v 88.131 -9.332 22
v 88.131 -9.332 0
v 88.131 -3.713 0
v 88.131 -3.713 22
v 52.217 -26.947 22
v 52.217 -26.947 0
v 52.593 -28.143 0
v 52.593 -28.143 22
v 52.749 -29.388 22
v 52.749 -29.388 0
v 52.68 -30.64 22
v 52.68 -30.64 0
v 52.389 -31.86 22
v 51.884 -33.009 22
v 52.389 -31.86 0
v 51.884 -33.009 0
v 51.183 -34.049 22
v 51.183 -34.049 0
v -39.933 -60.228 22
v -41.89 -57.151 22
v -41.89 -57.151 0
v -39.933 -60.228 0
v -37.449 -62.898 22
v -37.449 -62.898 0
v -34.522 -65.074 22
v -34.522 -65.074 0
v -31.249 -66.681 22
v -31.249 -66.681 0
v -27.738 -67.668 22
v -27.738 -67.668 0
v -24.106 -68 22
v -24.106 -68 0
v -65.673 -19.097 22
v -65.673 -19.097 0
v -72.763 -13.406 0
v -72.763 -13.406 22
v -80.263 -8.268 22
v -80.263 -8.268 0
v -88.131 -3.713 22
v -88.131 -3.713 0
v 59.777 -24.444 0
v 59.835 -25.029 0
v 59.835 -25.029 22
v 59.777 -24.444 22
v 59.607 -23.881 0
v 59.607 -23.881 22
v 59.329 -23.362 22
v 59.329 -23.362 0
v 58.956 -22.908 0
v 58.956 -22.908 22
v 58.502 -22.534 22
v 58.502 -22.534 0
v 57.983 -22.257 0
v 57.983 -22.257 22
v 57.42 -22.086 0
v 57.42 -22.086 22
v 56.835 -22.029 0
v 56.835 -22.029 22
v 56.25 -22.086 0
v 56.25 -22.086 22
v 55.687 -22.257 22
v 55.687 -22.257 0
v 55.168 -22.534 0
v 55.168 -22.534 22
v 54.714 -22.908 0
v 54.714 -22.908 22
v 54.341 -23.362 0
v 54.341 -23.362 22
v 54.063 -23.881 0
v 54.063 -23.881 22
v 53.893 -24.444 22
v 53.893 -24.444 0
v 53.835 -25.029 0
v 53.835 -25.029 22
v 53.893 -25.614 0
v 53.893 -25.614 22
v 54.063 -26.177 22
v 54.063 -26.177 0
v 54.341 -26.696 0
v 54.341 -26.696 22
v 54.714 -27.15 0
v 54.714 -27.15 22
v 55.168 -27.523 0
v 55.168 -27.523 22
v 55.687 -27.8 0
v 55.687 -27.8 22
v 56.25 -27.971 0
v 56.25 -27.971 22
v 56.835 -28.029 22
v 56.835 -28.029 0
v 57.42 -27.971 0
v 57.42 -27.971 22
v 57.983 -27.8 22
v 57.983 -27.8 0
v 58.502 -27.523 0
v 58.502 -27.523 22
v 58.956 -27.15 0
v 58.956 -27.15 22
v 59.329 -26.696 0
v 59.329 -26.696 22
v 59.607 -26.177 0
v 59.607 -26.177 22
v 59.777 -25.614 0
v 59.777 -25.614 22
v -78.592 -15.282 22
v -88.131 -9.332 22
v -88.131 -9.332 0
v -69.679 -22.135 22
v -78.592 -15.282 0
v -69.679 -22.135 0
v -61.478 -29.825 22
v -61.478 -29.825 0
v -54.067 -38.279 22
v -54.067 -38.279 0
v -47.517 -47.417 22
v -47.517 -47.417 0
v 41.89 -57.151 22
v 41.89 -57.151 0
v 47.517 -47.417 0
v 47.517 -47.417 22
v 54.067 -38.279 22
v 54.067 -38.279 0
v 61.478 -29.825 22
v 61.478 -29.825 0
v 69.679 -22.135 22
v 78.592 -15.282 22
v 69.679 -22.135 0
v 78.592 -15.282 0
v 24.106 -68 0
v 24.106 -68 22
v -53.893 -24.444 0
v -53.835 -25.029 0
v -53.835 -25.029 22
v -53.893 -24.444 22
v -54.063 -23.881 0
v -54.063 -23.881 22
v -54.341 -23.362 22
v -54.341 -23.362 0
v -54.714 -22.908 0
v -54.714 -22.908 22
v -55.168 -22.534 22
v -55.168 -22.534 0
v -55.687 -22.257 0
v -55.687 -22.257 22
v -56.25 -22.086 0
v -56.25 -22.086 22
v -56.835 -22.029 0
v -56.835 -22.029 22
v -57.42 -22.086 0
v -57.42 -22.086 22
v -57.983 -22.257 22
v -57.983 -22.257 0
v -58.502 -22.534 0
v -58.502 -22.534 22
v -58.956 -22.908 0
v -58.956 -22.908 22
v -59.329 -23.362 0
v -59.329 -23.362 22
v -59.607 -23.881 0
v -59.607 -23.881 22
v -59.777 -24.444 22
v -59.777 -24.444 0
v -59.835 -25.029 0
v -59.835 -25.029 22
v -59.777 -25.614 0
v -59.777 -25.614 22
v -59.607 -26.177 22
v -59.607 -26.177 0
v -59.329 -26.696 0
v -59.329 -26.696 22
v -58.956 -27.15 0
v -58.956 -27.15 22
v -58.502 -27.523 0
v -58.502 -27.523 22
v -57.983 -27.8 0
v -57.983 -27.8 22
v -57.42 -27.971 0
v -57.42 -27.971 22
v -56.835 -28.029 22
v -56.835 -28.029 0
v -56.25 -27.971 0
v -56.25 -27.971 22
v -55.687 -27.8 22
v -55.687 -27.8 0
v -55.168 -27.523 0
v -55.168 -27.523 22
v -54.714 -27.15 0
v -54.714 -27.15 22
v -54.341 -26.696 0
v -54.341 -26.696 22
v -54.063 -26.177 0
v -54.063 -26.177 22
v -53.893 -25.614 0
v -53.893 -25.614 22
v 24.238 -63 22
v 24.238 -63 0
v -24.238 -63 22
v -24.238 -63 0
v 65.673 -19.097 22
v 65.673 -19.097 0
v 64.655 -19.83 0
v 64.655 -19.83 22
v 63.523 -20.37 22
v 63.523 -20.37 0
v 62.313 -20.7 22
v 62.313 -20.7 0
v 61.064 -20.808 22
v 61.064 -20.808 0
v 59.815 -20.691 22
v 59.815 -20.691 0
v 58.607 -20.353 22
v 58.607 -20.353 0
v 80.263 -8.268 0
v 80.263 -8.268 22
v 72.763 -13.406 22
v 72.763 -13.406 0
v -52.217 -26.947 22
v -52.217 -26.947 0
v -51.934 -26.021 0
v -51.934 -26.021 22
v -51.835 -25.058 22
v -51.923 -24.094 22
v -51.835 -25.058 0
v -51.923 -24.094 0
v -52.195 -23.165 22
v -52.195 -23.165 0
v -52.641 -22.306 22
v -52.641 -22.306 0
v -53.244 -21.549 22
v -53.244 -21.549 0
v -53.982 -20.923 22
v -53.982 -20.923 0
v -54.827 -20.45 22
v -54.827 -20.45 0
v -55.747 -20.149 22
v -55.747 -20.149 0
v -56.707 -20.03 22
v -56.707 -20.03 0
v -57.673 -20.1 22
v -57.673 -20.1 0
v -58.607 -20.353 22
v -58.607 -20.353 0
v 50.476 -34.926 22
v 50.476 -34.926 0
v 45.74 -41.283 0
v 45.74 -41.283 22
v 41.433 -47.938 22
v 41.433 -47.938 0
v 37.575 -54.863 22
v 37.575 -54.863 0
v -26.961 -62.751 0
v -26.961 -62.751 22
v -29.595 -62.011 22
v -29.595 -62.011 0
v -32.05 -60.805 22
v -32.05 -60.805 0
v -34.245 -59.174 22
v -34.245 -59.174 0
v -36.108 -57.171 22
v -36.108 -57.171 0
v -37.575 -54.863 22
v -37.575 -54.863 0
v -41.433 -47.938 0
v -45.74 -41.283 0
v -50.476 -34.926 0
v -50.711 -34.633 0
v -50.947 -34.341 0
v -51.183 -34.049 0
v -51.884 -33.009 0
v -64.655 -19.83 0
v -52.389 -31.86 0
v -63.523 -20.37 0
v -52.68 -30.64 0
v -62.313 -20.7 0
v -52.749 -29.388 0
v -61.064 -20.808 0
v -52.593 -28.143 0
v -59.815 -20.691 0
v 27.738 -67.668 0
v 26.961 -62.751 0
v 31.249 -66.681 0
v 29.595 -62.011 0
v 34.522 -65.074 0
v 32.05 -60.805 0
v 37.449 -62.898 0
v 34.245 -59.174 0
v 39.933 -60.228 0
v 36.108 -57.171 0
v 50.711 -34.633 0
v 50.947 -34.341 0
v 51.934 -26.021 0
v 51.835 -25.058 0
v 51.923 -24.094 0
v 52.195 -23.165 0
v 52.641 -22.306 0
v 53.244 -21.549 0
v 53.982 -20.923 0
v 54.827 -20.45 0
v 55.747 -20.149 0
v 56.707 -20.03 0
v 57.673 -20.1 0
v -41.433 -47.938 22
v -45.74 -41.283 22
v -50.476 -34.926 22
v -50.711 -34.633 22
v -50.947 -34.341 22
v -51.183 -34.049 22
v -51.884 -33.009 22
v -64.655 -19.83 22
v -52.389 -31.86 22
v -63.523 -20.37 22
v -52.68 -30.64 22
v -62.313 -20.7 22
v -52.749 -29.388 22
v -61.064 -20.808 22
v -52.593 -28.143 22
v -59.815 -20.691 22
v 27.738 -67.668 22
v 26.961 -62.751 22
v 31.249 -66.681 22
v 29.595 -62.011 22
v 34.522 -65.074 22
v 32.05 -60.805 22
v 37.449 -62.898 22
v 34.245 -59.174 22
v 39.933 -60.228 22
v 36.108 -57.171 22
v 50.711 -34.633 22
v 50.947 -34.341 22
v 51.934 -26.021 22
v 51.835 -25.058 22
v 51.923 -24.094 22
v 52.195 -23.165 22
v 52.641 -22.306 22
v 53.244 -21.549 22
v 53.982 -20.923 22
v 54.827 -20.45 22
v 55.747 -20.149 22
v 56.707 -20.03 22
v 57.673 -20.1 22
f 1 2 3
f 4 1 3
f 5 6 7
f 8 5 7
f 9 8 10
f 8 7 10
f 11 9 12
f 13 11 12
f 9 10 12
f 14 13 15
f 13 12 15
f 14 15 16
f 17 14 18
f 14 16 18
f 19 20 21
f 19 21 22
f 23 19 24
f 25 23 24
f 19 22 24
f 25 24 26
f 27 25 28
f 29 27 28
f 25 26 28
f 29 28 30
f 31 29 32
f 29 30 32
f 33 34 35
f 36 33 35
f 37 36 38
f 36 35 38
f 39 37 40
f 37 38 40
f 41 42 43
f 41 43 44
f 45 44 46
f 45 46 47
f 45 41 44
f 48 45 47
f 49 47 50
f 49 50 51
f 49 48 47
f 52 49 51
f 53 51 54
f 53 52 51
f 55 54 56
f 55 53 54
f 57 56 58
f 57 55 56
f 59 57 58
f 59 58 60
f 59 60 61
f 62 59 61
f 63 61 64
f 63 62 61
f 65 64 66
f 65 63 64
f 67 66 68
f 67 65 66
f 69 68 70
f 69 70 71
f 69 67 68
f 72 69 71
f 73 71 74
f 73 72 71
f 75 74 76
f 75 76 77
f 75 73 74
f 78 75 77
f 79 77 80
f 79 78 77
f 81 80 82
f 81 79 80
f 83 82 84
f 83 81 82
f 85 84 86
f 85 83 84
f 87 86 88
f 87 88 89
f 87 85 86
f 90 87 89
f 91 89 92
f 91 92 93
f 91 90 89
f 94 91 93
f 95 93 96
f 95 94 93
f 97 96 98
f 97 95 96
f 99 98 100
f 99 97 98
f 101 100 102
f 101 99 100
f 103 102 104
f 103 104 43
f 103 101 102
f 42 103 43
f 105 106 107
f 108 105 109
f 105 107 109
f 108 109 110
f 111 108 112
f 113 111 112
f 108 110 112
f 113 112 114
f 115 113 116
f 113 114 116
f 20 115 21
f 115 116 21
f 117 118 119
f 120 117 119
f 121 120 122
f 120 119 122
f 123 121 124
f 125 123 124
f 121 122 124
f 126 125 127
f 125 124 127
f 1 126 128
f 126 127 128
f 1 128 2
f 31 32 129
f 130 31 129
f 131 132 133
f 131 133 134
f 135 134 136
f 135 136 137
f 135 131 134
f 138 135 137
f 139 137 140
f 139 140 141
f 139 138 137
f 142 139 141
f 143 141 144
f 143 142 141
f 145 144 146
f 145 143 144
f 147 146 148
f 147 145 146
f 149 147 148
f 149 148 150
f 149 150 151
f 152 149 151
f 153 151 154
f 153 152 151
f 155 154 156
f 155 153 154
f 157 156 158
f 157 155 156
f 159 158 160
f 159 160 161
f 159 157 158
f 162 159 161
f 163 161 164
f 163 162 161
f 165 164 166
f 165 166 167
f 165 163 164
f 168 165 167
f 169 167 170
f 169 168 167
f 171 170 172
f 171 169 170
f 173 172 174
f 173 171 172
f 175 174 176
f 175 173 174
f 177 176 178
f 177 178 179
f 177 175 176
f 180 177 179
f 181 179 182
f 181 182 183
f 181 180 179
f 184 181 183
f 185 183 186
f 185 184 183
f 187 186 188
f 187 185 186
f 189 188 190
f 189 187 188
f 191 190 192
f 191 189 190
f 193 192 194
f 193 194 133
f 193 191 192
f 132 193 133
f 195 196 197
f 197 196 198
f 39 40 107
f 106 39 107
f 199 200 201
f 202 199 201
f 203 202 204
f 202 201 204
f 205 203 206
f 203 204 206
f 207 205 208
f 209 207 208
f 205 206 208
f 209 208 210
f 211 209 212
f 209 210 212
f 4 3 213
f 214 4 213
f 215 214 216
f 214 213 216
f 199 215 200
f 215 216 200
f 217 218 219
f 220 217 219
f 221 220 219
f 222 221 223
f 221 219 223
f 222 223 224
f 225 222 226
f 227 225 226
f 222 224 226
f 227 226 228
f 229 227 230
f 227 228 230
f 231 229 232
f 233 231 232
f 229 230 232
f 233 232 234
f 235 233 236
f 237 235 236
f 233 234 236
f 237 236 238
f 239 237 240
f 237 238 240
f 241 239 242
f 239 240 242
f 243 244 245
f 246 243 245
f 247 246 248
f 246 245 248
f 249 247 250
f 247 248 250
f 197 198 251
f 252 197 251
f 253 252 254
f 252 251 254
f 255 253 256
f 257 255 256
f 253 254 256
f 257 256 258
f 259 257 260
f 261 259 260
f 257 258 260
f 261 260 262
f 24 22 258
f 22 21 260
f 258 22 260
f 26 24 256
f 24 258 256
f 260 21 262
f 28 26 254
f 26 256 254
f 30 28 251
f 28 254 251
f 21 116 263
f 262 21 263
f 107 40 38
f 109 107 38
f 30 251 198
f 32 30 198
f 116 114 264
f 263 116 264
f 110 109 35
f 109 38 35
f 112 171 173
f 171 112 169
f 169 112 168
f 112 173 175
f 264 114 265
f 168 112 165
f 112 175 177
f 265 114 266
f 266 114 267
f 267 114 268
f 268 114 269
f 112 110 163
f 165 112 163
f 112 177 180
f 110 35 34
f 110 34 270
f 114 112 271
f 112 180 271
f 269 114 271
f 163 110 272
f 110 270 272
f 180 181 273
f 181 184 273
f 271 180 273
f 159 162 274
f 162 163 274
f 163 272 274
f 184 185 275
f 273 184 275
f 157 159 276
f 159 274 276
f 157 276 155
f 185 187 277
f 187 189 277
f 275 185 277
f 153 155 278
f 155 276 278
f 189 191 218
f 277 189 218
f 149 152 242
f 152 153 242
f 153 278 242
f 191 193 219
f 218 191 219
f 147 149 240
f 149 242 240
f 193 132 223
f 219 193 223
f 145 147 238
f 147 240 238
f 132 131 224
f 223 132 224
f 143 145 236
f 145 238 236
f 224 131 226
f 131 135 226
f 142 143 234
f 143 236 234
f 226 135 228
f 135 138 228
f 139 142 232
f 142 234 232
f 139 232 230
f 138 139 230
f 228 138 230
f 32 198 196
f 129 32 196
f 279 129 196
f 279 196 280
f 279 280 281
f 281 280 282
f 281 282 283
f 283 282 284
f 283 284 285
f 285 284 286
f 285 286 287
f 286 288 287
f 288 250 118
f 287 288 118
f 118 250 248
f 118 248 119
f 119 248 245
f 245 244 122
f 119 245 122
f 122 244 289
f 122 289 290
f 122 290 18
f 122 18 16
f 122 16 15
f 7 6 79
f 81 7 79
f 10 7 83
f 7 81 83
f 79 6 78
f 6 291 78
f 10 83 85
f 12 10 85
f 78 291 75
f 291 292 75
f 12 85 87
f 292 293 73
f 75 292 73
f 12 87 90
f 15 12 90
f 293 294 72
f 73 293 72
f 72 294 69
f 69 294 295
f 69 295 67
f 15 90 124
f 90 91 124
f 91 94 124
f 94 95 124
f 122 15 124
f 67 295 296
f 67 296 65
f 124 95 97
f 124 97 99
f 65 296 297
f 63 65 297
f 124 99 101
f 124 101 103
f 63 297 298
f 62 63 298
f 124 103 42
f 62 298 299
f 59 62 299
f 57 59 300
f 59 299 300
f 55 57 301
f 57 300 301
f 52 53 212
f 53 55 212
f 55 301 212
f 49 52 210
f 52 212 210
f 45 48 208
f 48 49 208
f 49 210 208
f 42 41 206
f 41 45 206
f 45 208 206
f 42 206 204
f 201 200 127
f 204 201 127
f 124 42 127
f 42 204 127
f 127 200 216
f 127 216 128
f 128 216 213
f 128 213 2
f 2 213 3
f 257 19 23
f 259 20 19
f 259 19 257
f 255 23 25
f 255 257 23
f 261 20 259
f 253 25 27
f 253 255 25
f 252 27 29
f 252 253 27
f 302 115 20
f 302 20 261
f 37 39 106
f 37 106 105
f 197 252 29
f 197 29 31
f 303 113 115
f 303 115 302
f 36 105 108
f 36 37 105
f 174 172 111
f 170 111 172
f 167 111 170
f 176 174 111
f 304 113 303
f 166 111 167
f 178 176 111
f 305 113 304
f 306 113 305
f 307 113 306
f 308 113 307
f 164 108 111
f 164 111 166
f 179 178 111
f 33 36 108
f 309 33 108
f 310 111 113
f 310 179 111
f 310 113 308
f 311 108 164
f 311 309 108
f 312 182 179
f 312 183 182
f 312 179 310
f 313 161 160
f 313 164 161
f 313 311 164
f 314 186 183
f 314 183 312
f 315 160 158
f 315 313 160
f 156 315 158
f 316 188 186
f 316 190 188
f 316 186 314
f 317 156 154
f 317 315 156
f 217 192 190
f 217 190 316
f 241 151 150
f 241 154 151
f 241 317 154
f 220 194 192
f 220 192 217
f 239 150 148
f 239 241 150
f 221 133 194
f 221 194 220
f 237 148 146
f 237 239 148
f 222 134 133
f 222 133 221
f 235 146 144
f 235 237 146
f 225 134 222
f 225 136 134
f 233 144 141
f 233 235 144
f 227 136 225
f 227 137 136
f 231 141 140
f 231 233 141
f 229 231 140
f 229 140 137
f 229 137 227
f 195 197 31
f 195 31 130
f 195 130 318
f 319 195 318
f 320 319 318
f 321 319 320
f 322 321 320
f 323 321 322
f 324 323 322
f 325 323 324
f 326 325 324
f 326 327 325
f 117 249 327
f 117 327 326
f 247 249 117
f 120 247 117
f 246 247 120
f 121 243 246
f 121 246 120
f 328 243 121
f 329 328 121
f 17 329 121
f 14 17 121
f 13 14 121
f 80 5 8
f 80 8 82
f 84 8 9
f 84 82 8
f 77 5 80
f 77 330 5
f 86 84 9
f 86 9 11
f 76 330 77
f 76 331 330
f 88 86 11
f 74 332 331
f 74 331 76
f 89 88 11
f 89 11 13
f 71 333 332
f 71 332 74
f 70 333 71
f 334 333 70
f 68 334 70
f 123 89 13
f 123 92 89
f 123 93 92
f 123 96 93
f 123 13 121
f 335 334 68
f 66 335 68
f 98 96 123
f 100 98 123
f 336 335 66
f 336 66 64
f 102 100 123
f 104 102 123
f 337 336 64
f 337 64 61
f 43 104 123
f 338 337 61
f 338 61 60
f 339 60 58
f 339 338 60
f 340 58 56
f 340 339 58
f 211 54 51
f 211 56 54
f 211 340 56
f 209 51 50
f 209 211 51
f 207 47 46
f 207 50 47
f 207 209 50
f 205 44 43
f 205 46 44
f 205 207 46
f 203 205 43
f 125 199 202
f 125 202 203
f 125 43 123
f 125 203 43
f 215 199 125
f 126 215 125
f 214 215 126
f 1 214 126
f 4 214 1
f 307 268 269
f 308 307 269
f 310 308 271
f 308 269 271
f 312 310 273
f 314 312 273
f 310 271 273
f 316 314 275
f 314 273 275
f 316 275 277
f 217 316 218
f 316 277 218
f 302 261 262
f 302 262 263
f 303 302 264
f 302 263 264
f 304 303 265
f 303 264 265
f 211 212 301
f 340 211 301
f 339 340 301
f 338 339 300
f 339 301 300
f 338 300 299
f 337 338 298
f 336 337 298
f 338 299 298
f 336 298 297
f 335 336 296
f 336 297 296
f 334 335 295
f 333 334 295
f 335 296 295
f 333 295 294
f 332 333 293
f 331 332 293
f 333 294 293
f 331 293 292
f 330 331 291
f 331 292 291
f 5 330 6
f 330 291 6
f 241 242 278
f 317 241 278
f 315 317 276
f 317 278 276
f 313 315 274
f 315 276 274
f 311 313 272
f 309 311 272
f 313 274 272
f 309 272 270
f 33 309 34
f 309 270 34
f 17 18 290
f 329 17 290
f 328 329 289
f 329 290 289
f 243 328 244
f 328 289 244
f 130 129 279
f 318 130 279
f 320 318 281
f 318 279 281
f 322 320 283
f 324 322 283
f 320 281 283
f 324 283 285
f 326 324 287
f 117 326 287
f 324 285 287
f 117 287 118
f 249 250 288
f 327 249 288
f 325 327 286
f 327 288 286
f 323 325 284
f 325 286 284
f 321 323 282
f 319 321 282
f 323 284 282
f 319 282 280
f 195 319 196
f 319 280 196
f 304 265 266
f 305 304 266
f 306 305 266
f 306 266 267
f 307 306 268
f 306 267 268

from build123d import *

# Parameters (mm, degrees)
ESBO_O1_R                = 3
RESSALTO_EXTRUS_O1_DEPTH = 22


with BuildPart() as part:
    # Esboço1 → Ressalto-extrusão1 (new body)
    with BuildSketch(Plane.XY):
        with BuildLine():
            Line((-88.131389681, -3.713128135), (-88.131389681, -9.332118261))
            ThreePointArc((-88.131389681, -9.332118261), (-61.477752384, -29.824983348), (-41.890064111, -57.150728877))
            ThreePointArc((-41.890064111, -57.150728877), (-34.522230169, -65.073584532), (-24.106246719, -68))
            Line((-24.106246719, -68), (24.106246719, -68))
            ThreePointArc((24.106246719, -68), (34.522230169, -65.073584532), (41.890064111, -57.150728877))
            ThreePointArc((41.890064111, -57.150728877), (61.477752384, -29.824983348), (88.131389681, -9.332118261))
            Line((88.131389681, -9.332118261), (88.131389681, -3.713128135))
            ThreePointArc((88.131389681, -3.713128135), (76.464485554, -10.766043703), (65.672853174, -19.096766389))
            ThreePointArc((65.672853174, -19.096766389), (62.313137169, -20.69951591), (58.606836852, -20.353343104))
            ThreePointArc((58.606836852, -20.353343104), (53.244280911, -21.549279065), (52.217380785, -26.94675488))
            ThreePointArc((52.217380785, -26.94675488), (52.679803055, -30.640352489), (51.183377998, -34.048755298))
            ThreePointArc((51.183377998, -34.048755298), (50.828817615, -34.48677936), (50.476318173, -34.926463665))
            ThreePointArc((50.476318173, -34.926463665), (43.531544854, -44.57485582), (37.575499443, -54.863046658))
            ThreePointArc((37.575499443, -54.863046658), (32.049623987, -60.805188399), (24.2376364, -63))
            Line((24.2376364, -63), (-24.2376364, -63))
            ThreePointArc((-24.2376364, -63), (-32.049623987, -60.805188399), (-37.575499443, -54.863046658))
            ThreePointArc((-37.575499443, -54.863046658), (-43.531544854, -44.57485582), (-50.476318173, -34.926463665))
            ThreePointArc((-50.476318173, -34.926463665), (-50.828817615, -34.48677936), (-51.183377998, -34.048755298))
            ThreePointArc((-51.183377998, -34.048755298), (-52.679803055, -30.640352489), (-52.217380785, -26.94675488))
            ThreePointArc((-52.217380785, -26.94675488), (-53.244280911, -21.549279065), (-58.606836852, -20.353343104))
            ThreePointArc((-58.606836852, -20.353343104), (-62.313137169, -20.69951591), (-65.672853174, -19.096766389))
            ThreePointArc((-65.672853174, -19.096766389), (-76.464485554, -10.766043703), (-88.131389681, -3.713128135))
        make_face()
        with Locations((-56.834913612, -25.028841797)):
            Circle(ESBO_O1_R, mode=Mode.SUBTRACT)
        with Locations((56.834913612, -25.028841797)):
            Circle(ESBO_O1_R, mode=Mode.SUBTRACT)
    extrude(amount=RESSALTO_EXTRUS_O1_DEPTH)


solid = part.part
